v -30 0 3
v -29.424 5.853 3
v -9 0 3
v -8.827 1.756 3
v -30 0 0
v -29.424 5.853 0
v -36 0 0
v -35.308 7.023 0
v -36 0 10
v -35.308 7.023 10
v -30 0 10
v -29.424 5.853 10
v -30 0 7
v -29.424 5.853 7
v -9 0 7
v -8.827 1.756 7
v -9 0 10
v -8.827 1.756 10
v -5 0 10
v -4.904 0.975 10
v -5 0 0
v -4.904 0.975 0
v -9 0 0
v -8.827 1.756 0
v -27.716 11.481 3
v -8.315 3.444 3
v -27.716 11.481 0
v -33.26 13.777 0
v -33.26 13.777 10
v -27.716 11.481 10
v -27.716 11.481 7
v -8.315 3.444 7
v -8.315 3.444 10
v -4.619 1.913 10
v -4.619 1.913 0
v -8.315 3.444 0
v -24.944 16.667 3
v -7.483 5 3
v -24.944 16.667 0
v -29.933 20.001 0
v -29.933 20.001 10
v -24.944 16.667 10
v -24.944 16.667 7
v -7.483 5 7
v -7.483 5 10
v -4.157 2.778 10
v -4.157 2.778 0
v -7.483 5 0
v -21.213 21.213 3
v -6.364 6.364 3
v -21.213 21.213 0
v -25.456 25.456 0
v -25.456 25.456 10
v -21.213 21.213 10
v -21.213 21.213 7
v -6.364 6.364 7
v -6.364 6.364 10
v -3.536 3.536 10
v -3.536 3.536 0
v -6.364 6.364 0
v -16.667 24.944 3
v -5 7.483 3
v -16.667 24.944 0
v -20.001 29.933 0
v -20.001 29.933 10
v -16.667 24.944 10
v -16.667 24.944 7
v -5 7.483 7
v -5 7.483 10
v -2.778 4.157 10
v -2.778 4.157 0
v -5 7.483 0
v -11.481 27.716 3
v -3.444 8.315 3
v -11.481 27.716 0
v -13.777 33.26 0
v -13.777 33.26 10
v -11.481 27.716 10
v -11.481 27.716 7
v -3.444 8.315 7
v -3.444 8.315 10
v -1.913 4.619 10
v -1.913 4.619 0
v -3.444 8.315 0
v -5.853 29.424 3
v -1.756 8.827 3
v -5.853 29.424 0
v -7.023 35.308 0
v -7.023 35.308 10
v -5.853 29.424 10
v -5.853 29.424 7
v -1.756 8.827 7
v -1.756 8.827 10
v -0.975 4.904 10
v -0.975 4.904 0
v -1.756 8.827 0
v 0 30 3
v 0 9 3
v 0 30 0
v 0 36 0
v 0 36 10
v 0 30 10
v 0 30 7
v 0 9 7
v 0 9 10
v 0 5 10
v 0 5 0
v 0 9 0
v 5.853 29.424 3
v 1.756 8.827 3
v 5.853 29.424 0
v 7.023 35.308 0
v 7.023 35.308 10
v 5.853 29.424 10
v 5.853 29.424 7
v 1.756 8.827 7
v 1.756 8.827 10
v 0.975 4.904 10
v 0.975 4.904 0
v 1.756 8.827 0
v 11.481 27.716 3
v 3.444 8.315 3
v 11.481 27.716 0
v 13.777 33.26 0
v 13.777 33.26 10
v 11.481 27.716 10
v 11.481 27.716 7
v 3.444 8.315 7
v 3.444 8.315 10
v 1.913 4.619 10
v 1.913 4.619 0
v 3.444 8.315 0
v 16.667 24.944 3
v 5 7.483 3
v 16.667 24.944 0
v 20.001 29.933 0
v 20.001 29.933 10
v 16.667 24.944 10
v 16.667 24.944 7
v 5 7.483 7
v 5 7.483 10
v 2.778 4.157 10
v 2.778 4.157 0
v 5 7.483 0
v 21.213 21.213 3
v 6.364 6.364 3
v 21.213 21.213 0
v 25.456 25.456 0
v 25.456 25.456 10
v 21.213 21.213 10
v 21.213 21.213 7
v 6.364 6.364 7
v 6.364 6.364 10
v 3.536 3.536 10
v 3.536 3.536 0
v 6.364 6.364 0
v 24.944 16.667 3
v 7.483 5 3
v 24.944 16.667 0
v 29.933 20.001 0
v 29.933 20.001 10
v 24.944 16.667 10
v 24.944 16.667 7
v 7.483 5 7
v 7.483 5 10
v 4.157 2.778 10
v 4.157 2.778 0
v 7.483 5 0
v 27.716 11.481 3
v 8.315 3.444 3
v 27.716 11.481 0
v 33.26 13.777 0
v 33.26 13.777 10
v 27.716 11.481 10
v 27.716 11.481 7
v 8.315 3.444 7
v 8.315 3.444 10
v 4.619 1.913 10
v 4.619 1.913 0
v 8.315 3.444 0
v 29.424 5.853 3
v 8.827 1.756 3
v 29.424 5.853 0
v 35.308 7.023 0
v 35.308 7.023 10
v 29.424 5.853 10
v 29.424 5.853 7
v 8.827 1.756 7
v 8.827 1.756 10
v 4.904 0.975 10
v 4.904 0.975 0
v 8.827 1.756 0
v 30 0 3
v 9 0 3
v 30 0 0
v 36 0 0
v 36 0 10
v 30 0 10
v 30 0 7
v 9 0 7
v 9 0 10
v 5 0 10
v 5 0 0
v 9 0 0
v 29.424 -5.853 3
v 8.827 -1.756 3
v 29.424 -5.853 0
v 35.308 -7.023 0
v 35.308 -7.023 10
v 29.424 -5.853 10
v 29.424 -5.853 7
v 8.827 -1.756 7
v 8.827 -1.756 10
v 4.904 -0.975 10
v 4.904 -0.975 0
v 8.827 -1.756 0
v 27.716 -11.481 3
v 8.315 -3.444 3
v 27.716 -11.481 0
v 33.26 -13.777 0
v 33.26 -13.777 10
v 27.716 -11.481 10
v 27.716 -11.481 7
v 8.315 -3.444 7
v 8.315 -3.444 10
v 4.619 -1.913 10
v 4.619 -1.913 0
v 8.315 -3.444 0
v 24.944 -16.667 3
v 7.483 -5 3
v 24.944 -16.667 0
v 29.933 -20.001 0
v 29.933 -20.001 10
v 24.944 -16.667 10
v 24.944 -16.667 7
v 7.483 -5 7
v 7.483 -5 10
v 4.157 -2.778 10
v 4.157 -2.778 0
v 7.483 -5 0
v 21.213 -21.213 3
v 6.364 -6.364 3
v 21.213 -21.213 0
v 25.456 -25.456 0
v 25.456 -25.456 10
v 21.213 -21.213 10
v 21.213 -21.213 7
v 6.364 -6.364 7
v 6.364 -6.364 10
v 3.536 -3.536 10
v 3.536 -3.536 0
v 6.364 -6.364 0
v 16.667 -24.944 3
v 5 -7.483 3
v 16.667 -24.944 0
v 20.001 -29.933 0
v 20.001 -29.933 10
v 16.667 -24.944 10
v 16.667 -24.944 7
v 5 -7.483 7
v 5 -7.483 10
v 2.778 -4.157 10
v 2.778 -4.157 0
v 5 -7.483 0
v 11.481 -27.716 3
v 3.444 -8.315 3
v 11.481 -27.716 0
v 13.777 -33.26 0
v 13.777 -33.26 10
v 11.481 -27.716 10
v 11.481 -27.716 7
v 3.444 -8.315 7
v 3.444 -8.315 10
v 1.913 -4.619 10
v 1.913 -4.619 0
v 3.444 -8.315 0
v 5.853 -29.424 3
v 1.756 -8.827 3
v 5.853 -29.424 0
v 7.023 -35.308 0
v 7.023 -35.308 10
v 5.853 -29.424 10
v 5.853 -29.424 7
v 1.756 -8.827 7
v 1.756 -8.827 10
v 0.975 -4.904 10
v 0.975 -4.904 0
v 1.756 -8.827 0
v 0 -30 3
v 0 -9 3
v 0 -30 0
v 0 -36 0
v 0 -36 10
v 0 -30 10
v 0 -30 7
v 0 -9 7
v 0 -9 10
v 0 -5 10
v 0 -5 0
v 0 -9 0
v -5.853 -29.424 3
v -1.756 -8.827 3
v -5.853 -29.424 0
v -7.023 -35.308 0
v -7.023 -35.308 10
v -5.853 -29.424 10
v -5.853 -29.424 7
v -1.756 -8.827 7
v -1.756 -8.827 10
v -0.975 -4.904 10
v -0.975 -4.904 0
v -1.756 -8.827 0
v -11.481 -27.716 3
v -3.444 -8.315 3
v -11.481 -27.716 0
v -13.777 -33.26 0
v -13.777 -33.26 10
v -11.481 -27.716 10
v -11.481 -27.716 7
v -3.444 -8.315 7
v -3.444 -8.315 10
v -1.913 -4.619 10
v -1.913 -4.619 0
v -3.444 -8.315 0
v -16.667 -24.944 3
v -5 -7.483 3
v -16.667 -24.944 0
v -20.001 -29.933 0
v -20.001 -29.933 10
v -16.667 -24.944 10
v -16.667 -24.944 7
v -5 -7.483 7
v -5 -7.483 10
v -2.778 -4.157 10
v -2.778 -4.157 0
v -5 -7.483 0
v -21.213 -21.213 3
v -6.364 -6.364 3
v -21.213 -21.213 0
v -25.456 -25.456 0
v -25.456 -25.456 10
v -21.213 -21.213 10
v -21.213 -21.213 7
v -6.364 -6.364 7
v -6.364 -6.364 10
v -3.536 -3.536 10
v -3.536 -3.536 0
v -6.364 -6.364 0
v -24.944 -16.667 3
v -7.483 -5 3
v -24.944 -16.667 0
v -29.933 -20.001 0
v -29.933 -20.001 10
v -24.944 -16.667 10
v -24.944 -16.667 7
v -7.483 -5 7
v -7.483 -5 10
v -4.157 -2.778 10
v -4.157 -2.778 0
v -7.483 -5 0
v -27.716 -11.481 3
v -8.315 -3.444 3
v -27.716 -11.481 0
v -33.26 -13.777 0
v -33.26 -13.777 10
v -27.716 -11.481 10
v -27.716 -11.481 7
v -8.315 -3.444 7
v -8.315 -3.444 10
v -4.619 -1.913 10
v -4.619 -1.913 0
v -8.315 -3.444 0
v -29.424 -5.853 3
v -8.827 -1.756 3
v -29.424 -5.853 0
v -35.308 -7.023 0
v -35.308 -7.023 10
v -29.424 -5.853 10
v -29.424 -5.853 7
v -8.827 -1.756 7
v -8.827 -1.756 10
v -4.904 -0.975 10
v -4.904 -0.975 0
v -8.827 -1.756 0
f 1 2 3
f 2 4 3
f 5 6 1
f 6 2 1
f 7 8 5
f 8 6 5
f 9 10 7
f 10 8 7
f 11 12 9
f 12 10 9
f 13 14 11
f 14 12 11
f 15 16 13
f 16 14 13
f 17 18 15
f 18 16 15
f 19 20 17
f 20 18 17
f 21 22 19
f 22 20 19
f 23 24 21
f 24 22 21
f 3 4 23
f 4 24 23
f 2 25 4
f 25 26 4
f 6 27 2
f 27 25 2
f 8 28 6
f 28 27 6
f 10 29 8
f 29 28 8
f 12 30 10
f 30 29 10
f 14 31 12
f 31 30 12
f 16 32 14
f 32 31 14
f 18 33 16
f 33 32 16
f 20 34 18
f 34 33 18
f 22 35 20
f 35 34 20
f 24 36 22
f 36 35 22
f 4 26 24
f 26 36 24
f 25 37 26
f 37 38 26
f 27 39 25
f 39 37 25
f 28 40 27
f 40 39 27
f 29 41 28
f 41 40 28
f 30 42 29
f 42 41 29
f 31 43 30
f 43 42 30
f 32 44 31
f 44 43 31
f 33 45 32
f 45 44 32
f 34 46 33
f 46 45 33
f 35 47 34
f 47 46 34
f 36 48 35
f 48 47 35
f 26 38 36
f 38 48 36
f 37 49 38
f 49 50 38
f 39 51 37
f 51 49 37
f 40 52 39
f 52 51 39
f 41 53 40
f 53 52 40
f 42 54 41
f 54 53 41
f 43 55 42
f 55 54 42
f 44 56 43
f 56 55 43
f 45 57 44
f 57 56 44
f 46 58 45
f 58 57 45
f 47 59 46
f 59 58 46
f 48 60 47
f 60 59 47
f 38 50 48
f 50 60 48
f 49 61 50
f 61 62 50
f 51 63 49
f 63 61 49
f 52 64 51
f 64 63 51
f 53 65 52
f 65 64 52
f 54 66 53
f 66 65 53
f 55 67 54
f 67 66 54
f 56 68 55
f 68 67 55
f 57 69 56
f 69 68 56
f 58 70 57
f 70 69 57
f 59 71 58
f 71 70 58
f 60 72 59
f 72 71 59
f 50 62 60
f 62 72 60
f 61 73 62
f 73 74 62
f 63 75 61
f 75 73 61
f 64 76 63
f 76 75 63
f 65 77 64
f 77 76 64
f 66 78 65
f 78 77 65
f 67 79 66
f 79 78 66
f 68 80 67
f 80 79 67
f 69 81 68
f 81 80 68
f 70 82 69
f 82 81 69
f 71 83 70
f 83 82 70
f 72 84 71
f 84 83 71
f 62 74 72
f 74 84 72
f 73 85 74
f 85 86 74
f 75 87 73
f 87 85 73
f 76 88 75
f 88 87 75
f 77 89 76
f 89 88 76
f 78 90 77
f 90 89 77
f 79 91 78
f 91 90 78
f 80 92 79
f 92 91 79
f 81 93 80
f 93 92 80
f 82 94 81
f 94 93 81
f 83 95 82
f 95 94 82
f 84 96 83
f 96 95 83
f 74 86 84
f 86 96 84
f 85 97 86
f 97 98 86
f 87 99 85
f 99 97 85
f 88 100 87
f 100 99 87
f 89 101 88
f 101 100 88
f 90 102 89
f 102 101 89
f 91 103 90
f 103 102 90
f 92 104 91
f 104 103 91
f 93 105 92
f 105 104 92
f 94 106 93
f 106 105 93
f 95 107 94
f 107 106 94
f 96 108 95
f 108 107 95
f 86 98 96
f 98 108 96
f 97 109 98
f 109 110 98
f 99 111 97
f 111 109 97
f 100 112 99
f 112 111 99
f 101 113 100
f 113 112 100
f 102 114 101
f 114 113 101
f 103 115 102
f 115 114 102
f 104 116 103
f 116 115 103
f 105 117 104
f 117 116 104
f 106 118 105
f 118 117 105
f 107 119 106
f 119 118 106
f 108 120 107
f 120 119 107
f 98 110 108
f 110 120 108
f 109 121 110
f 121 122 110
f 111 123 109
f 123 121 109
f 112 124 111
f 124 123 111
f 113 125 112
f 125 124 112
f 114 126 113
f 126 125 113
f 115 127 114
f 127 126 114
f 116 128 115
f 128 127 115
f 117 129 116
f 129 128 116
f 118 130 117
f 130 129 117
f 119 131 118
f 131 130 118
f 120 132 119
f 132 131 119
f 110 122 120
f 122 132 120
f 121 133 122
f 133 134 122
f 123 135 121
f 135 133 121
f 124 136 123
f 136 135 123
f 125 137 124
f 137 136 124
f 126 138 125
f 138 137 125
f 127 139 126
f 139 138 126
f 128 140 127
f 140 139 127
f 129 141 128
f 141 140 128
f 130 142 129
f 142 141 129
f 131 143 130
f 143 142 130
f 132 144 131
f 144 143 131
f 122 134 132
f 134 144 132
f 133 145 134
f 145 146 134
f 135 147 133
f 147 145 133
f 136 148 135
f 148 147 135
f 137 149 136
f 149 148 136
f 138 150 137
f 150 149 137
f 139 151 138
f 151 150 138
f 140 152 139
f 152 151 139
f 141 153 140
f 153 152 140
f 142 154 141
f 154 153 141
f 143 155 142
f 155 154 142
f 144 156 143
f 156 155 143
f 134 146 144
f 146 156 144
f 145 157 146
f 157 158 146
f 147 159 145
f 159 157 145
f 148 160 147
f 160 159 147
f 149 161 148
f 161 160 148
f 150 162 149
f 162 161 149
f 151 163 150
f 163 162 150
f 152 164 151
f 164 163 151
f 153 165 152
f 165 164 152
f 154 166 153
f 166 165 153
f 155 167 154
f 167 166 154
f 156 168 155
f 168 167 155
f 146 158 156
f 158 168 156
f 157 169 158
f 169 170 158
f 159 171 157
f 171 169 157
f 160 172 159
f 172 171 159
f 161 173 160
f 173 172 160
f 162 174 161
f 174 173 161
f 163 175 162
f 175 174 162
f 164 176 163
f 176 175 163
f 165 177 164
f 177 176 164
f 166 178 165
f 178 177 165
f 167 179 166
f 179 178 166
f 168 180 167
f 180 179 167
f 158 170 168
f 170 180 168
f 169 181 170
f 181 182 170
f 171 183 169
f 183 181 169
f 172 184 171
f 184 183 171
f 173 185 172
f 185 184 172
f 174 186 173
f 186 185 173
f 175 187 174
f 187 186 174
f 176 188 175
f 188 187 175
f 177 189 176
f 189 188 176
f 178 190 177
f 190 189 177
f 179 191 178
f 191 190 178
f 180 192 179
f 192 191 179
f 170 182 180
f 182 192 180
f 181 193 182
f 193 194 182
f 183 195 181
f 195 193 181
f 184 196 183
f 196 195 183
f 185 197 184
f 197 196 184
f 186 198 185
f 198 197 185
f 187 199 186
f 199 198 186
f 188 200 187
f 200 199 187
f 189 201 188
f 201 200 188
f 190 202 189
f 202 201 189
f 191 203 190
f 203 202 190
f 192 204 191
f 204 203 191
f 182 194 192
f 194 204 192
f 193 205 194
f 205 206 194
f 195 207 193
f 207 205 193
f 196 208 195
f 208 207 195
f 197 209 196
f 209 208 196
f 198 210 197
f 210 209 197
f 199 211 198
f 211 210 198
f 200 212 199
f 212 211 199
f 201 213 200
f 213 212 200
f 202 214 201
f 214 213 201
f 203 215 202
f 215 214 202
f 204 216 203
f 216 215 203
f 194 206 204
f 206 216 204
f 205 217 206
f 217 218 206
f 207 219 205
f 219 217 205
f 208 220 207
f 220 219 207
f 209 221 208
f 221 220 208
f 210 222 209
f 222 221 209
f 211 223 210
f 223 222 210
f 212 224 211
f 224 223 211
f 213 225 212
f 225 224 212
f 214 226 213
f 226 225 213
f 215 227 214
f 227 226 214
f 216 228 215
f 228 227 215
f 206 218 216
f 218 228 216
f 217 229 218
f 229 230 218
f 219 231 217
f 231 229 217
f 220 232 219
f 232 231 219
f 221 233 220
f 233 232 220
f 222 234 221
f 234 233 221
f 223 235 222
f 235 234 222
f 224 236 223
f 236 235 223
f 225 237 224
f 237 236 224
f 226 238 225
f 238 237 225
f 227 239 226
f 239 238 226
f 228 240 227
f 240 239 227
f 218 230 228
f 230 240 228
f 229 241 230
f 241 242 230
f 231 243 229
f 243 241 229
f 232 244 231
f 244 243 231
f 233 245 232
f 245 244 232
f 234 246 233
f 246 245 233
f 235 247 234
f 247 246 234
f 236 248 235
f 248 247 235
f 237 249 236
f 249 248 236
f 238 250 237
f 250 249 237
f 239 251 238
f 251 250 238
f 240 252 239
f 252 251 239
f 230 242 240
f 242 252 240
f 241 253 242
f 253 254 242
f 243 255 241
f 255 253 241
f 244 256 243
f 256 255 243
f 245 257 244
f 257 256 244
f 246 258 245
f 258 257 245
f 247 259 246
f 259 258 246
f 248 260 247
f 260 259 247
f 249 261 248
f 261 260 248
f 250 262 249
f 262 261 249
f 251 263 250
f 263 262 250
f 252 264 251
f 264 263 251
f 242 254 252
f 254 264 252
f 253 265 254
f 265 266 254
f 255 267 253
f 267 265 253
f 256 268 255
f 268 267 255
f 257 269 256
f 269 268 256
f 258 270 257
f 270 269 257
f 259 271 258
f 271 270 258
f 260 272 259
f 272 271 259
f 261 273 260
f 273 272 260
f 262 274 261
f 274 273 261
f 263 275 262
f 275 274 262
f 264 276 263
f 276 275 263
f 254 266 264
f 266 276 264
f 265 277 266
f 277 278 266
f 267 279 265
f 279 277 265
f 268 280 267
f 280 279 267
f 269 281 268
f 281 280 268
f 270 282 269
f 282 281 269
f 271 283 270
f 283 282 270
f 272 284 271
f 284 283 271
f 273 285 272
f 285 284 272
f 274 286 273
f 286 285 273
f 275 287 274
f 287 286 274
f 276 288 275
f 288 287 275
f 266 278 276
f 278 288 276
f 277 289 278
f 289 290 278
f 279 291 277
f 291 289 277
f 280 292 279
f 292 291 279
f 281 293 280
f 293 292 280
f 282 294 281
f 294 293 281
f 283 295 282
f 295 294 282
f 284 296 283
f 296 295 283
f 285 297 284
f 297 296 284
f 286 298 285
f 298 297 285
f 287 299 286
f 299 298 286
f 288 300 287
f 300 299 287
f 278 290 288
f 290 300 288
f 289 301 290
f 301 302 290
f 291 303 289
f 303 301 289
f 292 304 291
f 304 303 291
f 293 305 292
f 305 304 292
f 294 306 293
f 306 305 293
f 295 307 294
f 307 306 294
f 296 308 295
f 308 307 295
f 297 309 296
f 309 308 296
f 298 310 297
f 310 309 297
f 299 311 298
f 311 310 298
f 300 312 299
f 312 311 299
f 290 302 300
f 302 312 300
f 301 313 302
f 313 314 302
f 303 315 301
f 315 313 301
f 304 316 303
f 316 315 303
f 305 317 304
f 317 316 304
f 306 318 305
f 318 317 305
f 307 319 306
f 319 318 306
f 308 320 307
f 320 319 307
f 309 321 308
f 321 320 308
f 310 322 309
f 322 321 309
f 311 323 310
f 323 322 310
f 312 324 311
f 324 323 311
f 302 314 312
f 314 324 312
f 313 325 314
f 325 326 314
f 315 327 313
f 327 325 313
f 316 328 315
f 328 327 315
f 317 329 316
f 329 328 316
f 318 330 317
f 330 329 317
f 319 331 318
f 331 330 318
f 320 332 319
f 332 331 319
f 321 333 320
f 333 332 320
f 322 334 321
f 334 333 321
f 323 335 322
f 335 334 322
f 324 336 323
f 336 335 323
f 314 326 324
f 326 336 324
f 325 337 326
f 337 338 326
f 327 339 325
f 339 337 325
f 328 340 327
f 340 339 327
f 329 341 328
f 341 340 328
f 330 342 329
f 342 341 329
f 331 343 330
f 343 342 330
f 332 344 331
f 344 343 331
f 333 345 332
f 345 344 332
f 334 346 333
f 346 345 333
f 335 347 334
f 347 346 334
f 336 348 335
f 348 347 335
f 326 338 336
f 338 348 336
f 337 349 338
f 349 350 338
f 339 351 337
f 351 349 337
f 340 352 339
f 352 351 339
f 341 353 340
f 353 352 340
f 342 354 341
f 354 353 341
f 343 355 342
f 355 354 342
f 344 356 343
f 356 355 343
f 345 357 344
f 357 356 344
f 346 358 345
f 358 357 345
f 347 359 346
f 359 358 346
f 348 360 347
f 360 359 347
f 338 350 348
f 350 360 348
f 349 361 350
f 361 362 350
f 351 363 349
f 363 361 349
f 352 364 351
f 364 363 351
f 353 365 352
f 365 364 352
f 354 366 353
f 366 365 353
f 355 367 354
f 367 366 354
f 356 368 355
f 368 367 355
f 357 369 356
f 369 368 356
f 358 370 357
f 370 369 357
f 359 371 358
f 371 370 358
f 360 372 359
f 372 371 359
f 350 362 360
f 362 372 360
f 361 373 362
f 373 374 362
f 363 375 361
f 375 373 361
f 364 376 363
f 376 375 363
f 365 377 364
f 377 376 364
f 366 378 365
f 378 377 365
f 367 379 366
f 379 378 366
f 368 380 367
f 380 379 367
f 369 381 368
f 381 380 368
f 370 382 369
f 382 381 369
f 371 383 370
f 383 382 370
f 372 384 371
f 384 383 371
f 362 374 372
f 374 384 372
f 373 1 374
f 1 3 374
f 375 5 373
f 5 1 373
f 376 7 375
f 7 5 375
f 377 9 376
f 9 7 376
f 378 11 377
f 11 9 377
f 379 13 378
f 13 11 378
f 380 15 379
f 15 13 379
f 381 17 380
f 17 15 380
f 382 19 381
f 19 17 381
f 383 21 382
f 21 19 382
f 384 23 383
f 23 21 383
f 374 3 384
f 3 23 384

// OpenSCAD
$fn = 32;

// ----------------------------------------------------------------------
// Revolved part: handwheel R36
// ----------------------------------------------------------------------

// --- parameters (mm) ---
bore_r = 5;               // bore radius
rim_r = 36;               // rim radius
rim_w = 6;                // rim axial width
rim_t = 10;               // rim diameter height
hub_r = 9;                // hub radius
web_t = 4;                // web thickness
revolve_angle = 360;      // revolve sweep, degrees

bore_d = 2 * bore_r;
rim_d = 2 * rim_r;
hub_d = 2 * hub_r;

profile = [[5, 0], [9, 0], [9, 3], [30, 3], [30, 0], [36, 0], [36, 10], [30, 10], [30, 7], [9, 7], [9, 10], [5, 10]];  // primary outline, 12 points, counter clockwise

// --- the one profile operation ---
rotate_extrude(angle = revolve_angle) polygon(points = profile);
